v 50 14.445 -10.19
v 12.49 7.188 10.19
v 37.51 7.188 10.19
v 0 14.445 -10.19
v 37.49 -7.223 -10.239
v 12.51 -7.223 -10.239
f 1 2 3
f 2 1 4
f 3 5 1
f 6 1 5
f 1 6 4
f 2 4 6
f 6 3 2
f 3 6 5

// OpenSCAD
//size of the pyramid (mm)
r = 50;

/* [Hidden] */
alpha = 54.8;

module puzzle (r=10){
    
difference() {
translate ([0,0,-r/(2*sqrt(2))])rotate ([alpha,0,0])pyramid(r);
  translate ([0,0,5*r]) cube([20*r,20*r,10*r], center = true);
}
}

module pyramid(side=50 ){

	
	
	{
		
			polyhedron (	points = [[0,0,0],[side,0,0],[side/2,sqrt(3)*side/2,0],
								[side/2,sqrt(3)*side/6,sqrt(6)/3*side]], 
						faces = [[0,1,2], [1,0,3], [2,1,3],[2,3,0]]);			
		
}	}

color("green")rotate([alpha,0,0]) puzzle(r);
*color("red") translate ([r/2,r/3.7,r/2.40])rotate([0,35,90]) rotate([0,90,0]) puzzle(r);
